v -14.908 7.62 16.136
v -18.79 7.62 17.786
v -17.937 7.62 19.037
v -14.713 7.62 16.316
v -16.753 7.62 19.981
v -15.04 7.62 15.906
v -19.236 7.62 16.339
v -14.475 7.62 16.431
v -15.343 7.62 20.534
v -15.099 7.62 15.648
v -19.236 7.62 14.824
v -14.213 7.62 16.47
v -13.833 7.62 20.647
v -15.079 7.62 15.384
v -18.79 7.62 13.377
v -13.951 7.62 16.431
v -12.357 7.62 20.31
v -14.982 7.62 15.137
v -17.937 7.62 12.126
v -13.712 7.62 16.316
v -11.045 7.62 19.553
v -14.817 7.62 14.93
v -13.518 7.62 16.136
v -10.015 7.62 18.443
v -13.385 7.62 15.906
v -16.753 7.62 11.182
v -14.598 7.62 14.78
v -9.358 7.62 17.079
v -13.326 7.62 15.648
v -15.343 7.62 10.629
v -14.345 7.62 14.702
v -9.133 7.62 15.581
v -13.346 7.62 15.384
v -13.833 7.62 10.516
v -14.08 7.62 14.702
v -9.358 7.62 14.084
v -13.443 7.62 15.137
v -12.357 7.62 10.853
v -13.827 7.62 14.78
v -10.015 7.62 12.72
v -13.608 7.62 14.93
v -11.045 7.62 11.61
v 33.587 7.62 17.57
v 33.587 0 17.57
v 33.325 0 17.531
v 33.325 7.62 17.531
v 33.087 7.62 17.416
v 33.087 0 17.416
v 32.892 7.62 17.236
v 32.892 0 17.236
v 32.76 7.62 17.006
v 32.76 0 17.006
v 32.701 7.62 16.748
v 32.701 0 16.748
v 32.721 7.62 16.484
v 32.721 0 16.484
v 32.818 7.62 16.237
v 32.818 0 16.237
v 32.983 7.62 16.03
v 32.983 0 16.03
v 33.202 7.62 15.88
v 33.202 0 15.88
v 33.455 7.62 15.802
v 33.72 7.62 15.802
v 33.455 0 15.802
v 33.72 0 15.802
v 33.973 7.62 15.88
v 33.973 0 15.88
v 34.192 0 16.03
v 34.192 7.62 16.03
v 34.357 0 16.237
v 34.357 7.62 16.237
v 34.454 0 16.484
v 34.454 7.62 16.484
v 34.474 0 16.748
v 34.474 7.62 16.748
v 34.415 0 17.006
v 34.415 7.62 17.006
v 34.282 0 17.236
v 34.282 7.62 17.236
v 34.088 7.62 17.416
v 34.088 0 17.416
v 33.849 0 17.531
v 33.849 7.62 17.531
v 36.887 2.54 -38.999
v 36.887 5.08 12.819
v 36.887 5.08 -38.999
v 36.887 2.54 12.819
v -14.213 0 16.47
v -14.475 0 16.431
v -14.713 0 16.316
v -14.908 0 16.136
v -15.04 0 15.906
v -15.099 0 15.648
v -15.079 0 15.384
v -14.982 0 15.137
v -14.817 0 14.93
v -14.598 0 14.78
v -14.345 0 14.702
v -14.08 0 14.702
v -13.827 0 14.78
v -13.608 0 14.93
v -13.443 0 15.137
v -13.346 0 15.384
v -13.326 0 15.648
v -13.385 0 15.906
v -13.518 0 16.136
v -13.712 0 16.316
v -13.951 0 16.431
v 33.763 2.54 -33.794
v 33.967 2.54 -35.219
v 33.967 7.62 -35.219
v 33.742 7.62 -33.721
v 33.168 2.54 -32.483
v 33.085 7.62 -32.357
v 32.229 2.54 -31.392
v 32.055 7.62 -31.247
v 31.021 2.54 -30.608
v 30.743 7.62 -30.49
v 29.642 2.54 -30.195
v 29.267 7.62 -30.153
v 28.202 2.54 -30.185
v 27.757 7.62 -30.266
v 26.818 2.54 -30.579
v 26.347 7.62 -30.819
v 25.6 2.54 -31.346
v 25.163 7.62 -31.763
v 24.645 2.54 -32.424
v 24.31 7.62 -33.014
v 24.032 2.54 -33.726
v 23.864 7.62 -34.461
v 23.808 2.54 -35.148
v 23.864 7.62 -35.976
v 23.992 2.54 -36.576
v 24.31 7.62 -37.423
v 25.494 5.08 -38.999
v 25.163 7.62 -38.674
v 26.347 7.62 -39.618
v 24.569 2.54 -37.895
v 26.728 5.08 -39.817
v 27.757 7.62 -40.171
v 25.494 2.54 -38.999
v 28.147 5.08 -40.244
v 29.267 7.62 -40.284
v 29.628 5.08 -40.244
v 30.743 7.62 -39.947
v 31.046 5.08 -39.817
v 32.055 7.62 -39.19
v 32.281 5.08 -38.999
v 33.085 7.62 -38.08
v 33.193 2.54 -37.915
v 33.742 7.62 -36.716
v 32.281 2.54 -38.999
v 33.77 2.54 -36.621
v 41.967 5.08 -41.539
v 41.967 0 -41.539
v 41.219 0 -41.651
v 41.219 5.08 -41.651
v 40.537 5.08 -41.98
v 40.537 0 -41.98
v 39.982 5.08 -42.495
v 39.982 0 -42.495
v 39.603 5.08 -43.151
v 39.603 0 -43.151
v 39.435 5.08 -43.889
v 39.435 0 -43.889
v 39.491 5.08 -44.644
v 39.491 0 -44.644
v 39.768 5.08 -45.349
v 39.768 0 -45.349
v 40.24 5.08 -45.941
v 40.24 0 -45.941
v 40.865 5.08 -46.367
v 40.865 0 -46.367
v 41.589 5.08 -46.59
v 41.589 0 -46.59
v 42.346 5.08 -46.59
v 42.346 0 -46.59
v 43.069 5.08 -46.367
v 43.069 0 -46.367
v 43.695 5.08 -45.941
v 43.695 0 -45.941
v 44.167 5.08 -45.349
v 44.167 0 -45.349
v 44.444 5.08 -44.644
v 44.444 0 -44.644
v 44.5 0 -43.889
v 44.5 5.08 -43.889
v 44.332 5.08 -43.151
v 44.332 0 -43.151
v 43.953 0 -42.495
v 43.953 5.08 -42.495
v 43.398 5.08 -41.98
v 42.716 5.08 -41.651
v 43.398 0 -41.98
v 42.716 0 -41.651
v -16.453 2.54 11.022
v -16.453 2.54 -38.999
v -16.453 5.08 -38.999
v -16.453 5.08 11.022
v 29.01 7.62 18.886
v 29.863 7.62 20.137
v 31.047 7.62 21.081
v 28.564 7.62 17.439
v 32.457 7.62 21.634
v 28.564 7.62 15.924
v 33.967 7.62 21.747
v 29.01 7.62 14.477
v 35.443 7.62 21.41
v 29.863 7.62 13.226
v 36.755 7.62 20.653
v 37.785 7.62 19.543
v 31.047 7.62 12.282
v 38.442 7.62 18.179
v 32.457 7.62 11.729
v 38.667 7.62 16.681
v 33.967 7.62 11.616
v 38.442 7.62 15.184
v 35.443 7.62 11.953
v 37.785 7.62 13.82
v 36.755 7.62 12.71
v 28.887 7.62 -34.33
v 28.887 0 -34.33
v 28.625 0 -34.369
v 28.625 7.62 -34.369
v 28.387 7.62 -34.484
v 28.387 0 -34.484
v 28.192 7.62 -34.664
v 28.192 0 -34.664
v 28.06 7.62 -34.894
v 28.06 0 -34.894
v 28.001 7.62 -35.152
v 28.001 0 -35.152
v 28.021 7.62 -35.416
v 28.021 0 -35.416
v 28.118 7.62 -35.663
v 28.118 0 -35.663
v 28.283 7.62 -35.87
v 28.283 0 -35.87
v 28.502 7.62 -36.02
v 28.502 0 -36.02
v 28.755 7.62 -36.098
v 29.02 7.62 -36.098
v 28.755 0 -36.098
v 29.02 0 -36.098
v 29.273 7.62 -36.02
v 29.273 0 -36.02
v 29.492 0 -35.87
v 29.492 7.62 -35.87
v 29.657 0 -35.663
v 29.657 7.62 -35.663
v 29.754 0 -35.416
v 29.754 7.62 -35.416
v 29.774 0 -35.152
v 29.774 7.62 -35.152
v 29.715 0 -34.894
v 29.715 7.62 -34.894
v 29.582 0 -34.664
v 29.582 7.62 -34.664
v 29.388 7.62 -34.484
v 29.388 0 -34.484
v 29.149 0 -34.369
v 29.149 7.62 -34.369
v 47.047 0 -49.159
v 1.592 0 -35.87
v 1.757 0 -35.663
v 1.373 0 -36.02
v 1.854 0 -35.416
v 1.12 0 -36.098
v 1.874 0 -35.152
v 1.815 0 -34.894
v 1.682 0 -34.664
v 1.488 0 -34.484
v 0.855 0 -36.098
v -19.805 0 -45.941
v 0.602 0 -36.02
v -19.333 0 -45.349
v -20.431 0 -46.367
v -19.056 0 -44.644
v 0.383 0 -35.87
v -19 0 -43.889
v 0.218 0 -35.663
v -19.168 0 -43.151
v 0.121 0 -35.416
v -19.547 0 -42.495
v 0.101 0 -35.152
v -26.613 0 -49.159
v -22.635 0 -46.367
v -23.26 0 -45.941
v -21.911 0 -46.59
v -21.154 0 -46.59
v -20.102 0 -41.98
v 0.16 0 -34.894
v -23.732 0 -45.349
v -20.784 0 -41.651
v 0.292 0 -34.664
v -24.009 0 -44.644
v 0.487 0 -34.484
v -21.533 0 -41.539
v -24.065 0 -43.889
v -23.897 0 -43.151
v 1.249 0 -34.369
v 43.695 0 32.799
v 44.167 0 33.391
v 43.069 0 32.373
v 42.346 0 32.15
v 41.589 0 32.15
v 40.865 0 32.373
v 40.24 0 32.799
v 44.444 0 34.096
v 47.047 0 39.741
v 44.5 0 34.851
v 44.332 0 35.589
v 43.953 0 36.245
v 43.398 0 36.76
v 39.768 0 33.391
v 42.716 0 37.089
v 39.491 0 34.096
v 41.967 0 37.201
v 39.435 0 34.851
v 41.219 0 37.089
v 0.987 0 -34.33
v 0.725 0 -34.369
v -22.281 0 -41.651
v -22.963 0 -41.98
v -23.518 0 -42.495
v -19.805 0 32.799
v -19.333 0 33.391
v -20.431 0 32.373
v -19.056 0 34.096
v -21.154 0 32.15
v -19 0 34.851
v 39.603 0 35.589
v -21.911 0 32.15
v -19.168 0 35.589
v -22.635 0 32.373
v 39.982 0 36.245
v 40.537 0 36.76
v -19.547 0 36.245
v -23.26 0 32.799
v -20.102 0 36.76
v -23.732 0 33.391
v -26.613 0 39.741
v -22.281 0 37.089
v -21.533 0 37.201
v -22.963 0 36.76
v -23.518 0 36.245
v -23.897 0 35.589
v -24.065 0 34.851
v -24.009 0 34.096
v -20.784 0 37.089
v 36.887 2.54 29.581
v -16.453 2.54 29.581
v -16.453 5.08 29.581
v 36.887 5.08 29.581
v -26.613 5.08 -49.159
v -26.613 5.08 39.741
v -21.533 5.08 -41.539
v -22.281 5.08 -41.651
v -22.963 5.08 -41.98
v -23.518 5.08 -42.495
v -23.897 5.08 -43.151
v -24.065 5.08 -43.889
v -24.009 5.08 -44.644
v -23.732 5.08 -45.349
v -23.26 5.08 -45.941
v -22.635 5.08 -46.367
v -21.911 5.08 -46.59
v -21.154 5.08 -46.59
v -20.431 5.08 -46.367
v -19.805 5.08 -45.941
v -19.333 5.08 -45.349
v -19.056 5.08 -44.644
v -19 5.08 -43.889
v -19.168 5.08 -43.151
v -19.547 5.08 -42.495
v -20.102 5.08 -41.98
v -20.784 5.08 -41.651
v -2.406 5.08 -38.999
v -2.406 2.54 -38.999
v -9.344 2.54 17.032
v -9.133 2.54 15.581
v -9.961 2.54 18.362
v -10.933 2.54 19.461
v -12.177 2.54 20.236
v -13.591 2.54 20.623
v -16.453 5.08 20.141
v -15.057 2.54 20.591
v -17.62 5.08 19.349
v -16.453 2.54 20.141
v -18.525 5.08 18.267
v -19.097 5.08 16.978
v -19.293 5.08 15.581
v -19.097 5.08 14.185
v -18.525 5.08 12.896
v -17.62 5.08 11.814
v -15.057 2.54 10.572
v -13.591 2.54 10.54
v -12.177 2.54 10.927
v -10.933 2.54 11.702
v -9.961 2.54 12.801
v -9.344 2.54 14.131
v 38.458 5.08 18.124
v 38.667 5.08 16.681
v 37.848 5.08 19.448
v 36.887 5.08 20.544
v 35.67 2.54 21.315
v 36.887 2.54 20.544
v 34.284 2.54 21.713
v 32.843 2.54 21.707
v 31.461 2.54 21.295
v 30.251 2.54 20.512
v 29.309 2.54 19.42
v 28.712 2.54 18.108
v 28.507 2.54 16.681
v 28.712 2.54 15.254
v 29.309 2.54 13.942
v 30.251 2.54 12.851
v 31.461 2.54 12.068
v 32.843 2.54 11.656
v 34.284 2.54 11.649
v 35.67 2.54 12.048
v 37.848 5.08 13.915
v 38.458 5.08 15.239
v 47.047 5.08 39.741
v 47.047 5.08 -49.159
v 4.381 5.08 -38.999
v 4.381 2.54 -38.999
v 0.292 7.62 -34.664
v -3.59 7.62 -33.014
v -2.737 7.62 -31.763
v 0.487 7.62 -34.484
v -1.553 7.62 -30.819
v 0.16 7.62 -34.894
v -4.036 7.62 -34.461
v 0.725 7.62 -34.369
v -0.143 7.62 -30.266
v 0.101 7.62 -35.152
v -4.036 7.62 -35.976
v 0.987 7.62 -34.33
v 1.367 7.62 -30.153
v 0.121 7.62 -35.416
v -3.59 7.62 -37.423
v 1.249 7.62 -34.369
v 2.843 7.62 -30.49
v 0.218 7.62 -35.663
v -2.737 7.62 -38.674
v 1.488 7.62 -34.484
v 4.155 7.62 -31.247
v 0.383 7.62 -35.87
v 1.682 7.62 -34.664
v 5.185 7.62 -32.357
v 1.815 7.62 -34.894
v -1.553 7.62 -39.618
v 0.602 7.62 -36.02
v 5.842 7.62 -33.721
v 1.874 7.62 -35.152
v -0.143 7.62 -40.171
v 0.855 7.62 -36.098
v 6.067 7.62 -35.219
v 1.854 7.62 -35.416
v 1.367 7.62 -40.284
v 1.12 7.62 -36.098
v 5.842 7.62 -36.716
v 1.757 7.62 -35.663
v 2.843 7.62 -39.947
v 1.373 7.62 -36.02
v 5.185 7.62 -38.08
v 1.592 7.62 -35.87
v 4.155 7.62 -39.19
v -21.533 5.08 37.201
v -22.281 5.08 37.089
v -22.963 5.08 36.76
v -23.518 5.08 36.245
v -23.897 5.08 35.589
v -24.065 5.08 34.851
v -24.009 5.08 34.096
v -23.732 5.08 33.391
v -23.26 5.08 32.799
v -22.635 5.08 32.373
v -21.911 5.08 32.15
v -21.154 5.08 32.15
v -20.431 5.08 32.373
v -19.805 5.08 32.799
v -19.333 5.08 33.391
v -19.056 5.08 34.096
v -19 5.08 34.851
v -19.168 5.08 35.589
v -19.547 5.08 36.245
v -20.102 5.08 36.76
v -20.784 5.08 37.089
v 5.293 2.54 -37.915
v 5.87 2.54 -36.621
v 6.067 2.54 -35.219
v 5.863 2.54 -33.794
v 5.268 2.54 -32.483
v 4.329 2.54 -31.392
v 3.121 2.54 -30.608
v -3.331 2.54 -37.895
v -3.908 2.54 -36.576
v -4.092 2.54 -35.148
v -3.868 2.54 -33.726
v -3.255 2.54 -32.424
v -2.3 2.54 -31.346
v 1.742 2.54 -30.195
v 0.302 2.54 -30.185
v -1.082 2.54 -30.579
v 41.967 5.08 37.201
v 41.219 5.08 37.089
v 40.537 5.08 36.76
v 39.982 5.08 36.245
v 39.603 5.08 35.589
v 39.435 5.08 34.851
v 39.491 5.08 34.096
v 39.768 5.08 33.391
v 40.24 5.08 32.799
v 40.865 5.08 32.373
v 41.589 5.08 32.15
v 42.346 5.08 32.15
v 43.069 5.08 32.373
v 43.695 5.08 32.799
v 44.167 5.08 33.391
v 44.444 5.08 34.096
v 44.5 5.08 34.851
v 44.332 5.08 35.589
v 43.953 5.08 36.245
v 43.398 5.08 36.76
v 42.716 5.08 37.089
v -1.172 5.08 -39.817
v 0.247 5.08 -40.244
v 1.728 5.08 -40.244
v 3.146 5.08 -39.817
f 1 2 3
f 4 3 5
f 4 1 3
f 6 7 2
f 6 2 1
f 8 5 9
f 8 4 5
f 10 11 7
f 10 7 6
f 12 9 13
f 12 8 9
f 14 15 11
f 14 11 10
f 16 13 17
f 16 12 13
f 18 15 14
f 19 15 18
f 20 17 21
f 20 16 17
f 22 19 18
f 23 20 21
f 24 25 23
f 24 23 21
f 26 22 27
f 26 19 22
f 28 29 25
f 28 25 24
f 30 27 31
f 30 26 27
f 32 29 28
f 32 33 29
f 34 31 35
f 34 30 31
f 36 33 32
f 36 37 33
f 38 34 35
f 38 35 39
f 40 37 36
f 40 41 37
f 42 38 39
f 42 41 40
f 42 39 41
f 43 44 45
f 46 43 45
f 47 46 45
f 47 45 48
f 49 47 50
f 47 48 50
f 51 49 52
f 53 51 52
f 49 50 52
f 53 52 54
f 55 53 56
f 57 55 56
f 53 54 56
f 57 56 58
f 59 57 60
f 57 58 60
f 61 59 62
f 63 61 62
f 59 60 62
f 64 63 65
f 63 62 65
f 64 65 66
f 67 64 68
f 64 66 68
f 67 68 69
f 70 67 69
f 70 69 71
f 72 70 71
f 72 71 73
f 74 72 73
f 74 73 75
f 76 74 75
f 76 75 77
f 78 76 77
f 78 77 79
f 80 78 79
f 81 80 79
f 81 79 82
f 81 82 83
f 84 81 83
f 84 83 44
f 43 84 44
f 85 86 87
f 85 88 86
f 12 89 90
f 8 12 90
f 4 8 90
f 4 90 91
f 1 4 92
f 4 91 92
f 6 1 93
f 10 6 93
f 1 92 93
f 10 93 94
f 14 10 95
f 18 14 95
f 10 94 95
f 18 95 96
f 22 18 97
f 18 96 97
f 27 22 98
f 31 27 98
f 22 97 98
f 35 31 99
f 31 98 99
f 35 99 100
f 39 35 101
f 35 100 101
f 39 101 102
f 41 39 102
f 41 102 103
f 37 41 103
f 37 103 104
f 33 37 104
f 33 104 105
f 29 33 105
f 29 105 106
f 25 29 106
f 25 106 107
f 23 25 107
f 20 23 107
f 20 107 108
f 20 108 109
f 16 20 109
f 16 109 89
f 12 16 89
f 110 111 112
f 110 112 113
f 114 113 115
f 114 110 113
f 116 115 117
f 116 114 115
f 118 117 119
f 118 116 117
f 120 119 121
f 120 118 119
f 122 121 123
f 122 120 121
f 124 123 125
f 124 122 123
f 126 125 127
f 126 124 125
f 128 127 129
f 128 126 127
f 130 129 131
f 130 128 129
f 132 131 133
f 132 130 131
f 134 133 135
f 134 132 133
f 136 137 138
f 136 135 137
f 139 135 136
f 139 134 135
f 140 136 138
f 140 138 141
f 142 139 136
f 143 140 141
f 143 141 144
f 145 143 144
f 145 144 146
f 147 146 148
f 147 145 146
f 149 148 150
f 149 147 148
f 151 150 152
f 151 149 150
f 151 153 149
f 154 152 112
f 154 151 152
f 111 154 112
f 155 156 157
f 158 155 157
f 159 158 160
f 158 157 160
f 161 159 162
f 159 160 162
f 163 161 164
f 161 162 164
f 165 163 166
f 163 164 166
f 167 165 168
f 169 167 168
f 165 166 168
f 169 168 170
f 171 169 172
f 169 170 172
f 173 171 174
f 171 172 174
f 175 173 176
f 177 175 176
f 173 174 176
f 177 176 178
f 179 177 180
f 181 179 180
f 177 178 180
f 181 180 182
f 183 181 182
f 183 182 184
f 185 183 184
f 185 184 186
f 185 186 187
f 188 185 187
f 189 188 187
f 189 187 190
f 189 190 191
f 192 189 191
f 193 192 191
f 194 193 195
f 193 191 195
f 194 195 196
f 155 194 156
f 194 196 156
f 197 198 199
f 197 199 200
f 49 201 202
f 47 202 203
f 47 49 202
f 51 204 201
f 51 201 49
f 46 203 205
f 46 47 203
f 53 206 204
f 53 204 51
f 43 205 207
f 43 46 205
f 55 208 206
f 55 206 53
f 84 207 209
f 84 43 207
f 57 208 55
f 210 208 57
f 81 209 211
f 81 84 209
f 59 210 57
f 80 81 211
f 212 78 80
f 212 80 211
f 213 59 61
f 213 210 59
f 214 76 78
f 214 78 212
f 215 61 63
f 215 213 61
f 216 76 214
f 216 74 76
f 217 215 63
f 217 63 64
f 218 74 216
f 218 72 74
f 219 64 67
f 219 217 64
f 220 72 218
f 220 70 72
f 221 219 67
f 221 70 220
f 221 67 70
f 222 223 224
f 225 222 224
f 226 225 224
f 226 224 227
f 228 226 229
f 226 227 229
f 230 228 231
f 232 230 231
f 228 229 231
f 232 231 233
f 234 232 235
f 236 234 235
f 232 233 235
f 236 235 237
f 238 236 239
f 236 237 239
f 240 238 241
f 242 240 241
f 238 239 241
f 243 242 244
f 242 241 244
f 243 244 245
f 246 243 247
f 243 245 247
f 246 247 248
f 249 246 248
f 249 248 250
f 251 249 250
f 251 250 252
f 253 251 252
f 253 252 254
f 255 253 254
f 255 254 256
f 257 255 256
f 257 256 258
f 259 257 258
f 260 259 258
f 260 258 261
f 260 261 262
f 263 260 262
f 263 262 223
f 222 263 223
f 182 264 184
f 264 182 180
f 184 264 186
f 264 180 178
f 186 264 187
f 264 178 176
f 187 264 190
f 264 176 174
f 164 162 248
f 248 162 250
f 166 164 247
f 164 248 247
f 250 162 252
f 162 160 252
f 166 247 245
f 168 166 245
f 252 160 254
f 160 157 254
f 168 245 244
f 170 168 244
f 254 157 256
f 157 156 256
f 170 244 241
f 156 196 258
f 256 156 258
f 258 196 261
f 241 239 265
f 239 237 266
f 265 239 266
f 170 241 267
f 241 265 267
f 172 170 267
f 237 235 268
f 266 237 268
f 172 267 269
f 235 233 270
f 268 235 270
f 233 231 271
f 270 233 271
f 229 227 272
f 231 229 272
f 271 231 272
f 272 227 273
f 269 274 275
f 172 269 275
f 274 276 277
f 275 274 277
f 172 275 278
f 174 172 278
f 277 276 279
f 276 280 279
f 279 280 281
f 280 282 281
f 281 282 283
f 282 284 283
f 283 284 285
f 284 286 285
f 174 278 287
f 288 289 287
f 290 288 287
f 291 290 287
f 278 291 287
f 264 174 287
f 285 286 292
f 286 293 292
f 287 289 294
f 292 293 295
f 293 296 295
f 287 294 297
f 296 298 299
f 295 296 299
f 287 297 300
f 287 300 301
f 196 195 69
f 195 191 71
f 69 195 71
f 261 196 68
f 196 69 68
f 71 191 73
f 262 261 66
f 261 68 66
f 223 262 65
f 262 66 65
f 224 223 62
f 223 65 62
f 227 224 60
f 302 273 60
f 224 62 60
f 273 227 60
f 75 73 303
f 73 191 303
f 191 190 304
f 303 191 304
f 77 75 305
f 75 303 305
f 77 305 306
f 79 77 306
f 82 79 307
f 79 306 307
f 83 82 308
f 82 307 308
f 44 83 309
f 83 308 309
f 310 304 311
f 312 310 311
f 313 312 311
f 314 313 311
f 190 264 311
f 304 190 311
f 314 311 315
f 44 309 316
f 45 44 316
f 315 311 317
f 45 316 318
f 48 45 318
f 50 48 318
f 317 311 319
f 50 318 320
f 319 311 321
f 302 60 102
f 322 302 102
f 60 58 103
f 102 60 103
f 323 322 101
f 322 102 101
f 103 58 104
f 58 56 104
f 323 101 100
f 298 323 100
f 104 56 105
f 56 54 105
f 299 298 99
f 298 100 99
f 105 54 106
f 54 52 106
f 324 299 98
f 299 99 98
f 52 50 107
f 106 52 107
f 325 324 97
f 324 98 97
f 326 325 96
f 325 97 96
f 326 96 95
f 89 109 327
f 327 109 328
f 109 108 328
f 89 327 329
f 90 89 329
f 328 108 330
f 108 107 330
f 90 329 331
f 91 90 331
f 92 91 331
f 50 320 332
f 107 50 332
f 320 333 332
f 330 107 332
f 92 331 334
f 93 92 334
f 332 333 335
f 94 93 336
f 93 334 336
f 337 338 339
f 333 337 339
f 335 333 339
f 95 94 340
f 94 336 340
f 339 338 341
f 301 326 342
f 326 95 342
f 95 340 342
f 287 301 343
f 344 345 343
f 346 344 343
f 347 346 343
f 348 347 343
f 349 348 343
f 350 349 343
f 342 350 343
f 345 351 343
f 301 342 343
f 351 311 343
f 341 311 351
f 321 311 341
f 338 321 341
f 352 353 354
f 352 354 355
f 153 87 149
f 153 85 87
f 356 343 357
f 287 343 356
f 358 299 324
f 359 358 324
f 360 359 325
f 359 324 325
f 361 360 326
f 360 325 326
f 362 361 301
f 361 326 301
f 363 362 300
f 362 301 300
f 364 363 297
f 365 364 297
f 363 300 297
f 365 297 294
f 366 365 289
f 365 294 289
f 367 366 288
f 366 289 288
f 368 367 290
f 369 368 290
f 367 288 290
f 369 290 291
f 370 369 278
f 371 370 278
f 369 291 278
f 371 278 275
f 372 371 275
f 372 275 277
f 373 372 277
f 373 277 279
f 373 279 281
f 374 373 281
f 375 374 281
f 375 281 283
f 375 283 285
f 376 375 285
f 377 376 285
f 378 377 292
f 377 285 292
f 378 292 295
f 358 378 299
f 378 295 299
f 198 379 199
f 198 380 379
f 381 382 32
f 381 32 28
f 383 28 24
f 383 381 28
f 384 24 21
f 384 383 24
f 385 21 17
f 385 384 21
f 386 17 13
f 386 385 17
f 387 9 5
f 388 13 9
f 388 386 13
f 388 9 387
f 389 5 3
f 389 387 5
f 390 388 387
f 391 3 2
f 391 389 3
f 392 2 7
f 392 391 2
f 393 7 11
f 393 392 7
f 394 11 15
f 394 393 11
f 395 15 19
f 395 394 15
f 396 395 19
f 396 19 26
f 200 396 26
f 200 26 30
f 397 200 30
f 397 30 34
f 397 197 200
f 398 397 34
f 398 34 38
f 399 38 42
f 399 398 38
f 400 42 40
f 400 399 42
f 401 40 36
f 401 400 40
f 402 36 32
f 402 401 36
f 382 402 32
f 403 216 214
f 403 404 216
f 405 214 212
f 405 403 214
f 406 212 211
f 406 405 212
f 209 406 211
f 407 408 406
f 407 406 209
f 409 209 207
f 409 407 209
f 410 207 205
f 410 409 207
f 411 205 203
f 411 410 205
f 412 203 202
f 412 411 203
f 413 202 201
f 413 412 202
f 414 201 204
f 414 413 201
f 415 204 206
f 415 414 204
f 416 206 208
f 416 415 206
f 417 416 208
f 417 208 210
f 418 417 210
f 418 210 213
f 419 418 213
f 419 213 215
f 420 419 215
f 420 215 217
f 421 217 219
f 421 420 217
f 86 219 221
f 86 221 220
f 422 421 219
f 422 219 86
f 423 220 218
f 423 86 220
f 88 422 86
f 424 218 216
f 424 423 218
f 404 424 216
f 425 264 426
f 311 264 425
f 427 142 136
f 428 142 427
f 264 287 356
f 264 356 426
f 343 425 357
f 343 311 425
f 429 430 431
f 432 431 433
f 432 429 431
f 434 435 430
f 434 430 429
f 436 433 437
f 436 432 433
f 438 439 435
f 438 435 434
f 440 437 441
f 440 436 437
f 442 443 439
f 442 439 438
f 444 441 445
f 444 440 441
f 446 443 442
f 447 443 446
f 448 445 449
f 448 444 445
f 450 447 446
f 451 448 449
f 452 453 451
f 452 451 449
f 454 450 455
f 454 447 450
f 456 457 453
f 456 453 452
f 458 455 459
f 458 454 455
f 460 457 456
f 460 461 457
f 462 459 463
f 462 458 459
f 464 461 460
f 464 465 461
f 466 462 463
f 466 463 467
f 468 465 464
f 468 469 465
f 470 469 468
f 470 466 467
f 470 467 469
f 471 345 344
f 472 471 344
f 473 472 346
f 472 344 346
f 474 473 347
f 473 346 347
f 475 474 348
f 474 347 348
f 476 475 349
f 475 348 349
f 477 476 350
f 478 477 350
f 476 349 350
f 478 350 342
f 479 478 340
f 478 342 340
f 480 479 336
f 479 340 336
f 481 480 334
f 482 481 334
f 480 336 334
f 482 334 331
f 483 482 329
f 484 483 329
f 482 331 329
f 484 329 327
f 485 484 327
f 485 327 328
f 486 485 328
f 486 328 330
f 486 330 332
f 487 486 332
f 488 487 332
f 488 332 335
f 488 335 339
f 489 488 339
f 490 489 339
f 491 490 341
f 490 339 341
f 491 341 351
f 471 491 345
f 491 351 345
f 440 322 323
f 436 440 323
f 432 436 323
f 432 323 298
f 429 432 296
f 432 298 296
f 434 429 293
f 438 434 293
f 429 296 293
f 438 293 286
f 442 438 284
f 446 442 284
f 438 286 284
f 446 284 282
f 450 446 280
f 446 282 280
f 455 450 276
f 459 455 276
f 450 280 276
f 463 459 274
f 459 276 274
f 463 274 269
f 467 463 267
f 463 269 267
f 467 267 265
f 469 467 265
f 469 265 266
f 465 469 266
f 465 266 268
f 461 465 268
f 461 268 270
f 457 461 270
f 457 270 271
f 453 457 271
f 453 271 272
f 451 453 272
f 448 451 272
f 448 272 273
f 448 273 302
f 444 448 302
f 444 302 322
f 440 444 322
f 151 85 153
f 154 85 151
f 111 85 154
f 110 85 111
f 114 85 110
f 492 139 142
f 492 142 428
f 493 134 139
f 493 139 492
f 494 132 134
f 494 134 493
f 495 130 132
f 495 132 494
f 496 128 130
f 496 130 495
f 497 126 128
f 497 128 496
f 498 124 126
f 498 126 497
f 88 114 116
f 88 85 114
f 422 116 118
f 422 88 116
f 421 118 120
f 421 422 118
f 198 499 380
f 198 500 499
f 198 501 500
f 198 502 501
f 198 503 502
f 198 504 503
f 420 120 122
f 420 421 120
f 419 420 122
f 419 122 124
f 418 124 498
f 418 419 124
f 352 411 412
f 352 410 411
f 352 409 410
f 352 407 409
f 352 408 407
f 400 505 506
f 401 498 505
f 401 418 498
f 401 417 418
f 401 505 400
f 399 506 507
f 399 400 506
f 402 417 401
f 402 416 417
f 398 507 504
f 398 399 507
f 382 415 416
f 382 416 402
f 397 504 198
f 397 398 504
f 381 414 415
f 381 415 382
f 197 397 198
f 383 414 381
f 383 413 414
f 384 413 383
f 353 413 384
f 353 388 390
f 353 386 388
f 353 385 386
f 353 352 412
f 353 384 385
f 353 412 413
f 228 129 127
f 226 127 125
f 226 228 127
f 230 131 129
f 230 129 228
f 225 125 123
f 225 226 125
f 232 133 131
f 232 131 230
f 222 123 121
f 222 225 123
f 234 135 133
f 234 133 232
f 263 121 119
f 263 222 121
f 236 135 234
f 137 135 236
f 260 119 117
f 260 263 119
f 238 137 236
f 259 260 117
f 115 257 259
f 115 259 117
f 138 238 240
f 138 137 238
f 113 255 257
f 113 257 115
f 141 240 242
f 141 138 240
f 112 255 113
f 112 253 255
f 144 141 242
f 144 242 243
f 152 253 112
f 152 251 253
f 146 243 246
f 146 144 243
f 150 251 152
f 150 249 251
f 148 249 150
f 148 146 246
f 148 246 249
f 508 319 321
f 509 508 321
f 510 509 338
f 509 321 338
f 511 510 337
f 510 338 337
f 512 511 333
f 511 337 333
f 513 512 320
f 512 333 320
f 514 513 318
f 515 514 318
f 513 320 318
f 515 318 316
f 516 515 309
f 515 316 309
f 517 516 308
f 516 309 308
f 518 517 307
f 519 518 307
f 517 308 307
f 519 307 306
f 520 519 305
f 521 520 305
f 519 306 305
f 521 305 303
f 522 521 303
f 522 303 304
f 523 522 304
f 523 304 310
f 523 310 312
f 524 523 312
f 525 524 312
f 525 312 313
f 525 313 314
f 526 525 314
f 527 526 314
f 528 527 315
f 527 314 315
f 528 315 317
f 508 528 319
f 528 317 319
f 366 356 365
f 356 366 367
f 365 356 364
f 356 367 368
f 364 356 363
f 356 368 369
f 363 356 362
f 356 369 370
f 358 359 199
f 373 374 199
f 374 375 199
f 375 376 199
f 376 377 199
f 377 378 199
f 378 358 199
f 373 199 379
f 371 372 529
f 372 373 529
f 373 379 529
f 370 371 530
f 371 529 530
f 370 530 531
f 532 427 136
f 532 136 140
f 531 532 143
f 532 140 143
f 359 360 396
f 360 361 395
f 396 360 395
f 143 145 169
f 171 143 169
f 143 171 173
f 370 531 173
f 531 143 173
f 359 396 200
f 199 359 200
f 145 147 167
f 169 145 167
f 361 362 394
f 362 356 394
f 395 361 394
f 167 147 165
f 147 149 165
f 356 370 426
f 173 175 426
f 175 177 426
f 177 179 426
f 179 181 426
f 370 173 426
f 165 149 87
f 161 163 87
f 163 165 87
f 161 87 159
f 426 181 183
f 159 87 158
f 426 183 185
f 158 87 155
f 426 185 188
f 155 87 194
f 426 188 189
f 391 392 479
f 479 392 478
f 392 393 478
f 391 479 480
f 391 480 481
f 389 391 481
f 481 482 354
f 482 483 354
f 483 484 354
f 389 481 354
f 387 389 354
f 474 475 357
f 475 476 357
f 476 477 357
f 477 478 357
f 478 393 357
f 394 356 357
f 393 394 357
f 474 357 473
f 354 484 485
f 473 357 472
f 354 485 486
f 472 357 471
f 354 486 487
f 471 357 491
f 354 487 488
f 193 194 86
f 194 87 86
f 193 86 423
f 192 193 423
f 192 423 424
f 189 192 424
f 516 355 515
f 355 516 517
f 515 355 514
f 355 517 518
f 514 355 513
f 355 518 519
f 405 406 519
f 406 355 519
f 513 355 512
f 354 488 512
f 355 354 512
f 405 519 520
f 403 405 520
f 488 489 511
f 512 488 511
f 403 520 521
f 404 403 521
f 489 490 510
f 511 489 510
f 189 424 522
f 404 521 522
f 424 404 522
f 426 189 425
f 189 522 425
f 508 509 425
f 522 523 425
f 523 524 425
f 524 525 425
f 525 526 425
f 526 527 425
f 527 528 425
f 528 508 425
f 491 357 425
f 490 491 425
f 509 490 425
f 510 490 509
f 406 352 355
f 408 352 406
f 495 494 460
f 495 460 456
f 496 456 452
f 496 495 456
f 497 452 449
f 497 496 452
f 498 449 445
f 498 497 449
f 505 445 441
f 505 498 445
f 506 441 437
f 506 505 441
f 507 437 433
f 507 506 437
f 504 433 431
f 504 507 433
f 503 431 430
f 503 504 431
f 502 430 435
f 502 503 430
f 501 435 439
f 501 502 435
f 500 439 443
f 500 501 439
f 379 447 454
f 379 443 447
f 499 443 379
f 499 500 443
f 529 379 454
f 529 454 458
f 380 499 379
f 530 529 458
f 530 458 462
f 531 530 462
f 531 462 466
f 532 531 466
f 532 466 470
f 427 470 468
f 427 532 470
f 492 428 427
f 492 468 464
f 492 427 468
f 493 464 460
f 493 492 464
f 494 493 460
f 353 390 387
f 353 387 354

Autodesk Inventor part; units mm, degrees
ref_plane "YZ Plane" through (0, 0, 0) normal (1, 0, 0) x (0, 1, 0)
ref_plane "XZ Plane" through (0, 0, 0) normal (0, 1, 0) x (-1, 0, 0)
ref_plane "XY Plane" through (0, 0, 0) normal (0, 0, 1) x (1, 0, 0)
sketch "Sketch1" plane through (0, 0, 0) normal (0, 1, 0) x (-1, 0, 0)
  line L0 (16.4526, 29.5814) -> (-36.8874, 29.5814)
  line L1 (-36.8874, 29.5814) -> (-36.8874, -38.9986)
  line L2 (-36.8874, -38.9986) -> (16.4526, -38.9986)
  line L3 (16.4526, -38.9986) -> (16.4526, 29.5814)
  point P0 (0, 0)
  dimension "d0" = 68.58
  dimension "d1" = 53.34
extrude "Extrusion1" add sketch "Sketch1" along normal blind 2.54
sketch "Sketch2" plane through (0, 0, 0) normal (0, -1, 0) x (1, 0, 0)
  line L0 (-26.6126, -49.1586) -> (47.0474, -49.1586)
  line L1 (47.0474, -49.1586) -> (47.0474, 39.7414)
  line L2 (47.0474, 39.7414) -> (-26.6126, 39.7414)
  line L3 (-26.6126, 39.7414) -> (-26.6126, -49.1586)
  line L4 (-16.4526, -38.9986) -> (-16.4526, 29.5814) projected
  line L5 (36.8874, 29.5814) -> (36.8874, -38.9986) projected
  line L6 (-16.4526, 29.5814) -> (36.8874, 29.5814) projected
  line L7 (36.8874, -38.9986) -> (-16.4526, -38.9986) projected
  point P0 (0, 0)
  dimension "d4" = 10.16
  dimension "d5" = 10.16
  dimension "d6" = 10.16
  dimension "d7" = 10.16
extrude "Extrusion2" add sketch "Sketch2" against normal blind 5.08
sketch "Sketch3" plane through (0, 5.08, 0) normal (0, 1, 0) x (1, 0, 0)
  line L0 (-26.6126, -39.7414) -> (47.0474, -39.7414) projected
  line L1 (-26.6126, 49.1586) -> (-26.6126, -39.7414) projected
  line L2 (47.0474, 49.1586) -> (-26.6126, 49.1586) projected
  line L3 (47.0474, -39.7414) -> (47.0474, 49.1586) projected
  point P0 (0, 0)
  point P1 (-21.5326, -34.6614)
  point P2 (41.9674, -34.6614)
  point P3 (41.9674, 44.0786)
  point P4 (-21.5326, 44.0786)
  dimension "d10" = 5.08
  dimension "d11" = 5.08
  dimension "d12" = 0
  dimension "d13" = 5.08
  dimension "d14" = 0
  dimension "d15" = 0
  dimension "d16" = 5.08
  dimension "d17" = 0
hole "Hole1" at (-21.5326, 5.08, 34.6614) at (41.9674, 5.08, 34.6614) at (41.9674, 5.08, -44.0786) at (-21.5326, 5.08, -44.0786) direction (0, -1, 0) diameter 5.08 depth 25.4 tip angle 118
sketch "Sketch4" plane through (0, 2.54, 0) normal (0, 1, 0) x (1, 0, 0)
  circle A0 centre (-14.2126, -15.5814) radius 5.08
  circle A1 centre (33.5874, -16.6814) radius 5.08
  circle A2 centre (28.8874, 35.2186) radius 5.08
  circle A3 centre (0.9874, 35.2186) radius 5.08
  line L0 (36.8874, 38.9986) -> (36.8874, -29.5814) projected
  line L1 (-26.6126, -39.7414) -> (47.0474, -39.7414) projected
  line L2 (36.8874, -29.5814) -> (-16.4526, -29.5814) projected
  line L3 (-16.4526, -29.5814) -> (-16.4526, 38.9986) projected
  point P0 (0, 0)
  dimension "d25" = 10.16
  dimension "d26" = 10.16
  dimension "d27" = 10.16
  dimension "d28" = 10.16
  dimension "d36" = 27.9
  dimension "d41" = 51.9
  dimension "d42" = 50.8
  dimension "d43" = 15.2
  dimension "d44" = 0
  dimension "d45" = 3.3
  dimension "d46" = 4.7
  dimension "d47" = 14
extrude "Extrusion3" add sketch "Sketch4" along normal blind 5.08
sketch "Sketch5" plane through (0.9874, 7.62, -35.2186) normal (0, 1, 0) x (1, 0, 0)
  point P0 (-0.9874, -35.2186)
  point P1 (0, 0)
hole "Hole2" at (0.9874, 7.62, -35.2186) direction (0, -1, 0) diameter 1.778 depth 25.4 tip angle 118
sketch "Sketch6" plane through (28.8874, 7.62, -35.2186) normal (0, 1, 0) x (1, 0, 0)
  point P0 (-28.8874, -35.2186)
  point P1 (0, 0)
hole "Hole3" at (28.8874, 7.62, -35.2186) direction (0, -1, 0) diameter 1.778 depth 25.4 tip angle 118
sketch "Sketch7" plane through (33.5874, 7.62, 16.6814) normal (0, 1, 0) x (1, 0, 0)
  point P0 (-33.5874, 16.6814)
  point P1 (0, 0)
hole "Hole4" at (33.5874, 7.62, 16.6814) direction (0, -1, 0) diameter 1.778 depth 25.4 tip angle 118
sketch "Sketch8" plane through (-14.2126, 7.62, 15.5814) normal (0, 1, 0) x (1, 0, 0)
  point P0 (14.2126, 15.5814)
  point P1 (0, 0)
hole "Hole5" at (-14.2126, 7.62, 15.5814) direction (0, -1, 0) diameter 1.778 depth 25.4 tip angle 118
properties part number "ArduinoMount"
